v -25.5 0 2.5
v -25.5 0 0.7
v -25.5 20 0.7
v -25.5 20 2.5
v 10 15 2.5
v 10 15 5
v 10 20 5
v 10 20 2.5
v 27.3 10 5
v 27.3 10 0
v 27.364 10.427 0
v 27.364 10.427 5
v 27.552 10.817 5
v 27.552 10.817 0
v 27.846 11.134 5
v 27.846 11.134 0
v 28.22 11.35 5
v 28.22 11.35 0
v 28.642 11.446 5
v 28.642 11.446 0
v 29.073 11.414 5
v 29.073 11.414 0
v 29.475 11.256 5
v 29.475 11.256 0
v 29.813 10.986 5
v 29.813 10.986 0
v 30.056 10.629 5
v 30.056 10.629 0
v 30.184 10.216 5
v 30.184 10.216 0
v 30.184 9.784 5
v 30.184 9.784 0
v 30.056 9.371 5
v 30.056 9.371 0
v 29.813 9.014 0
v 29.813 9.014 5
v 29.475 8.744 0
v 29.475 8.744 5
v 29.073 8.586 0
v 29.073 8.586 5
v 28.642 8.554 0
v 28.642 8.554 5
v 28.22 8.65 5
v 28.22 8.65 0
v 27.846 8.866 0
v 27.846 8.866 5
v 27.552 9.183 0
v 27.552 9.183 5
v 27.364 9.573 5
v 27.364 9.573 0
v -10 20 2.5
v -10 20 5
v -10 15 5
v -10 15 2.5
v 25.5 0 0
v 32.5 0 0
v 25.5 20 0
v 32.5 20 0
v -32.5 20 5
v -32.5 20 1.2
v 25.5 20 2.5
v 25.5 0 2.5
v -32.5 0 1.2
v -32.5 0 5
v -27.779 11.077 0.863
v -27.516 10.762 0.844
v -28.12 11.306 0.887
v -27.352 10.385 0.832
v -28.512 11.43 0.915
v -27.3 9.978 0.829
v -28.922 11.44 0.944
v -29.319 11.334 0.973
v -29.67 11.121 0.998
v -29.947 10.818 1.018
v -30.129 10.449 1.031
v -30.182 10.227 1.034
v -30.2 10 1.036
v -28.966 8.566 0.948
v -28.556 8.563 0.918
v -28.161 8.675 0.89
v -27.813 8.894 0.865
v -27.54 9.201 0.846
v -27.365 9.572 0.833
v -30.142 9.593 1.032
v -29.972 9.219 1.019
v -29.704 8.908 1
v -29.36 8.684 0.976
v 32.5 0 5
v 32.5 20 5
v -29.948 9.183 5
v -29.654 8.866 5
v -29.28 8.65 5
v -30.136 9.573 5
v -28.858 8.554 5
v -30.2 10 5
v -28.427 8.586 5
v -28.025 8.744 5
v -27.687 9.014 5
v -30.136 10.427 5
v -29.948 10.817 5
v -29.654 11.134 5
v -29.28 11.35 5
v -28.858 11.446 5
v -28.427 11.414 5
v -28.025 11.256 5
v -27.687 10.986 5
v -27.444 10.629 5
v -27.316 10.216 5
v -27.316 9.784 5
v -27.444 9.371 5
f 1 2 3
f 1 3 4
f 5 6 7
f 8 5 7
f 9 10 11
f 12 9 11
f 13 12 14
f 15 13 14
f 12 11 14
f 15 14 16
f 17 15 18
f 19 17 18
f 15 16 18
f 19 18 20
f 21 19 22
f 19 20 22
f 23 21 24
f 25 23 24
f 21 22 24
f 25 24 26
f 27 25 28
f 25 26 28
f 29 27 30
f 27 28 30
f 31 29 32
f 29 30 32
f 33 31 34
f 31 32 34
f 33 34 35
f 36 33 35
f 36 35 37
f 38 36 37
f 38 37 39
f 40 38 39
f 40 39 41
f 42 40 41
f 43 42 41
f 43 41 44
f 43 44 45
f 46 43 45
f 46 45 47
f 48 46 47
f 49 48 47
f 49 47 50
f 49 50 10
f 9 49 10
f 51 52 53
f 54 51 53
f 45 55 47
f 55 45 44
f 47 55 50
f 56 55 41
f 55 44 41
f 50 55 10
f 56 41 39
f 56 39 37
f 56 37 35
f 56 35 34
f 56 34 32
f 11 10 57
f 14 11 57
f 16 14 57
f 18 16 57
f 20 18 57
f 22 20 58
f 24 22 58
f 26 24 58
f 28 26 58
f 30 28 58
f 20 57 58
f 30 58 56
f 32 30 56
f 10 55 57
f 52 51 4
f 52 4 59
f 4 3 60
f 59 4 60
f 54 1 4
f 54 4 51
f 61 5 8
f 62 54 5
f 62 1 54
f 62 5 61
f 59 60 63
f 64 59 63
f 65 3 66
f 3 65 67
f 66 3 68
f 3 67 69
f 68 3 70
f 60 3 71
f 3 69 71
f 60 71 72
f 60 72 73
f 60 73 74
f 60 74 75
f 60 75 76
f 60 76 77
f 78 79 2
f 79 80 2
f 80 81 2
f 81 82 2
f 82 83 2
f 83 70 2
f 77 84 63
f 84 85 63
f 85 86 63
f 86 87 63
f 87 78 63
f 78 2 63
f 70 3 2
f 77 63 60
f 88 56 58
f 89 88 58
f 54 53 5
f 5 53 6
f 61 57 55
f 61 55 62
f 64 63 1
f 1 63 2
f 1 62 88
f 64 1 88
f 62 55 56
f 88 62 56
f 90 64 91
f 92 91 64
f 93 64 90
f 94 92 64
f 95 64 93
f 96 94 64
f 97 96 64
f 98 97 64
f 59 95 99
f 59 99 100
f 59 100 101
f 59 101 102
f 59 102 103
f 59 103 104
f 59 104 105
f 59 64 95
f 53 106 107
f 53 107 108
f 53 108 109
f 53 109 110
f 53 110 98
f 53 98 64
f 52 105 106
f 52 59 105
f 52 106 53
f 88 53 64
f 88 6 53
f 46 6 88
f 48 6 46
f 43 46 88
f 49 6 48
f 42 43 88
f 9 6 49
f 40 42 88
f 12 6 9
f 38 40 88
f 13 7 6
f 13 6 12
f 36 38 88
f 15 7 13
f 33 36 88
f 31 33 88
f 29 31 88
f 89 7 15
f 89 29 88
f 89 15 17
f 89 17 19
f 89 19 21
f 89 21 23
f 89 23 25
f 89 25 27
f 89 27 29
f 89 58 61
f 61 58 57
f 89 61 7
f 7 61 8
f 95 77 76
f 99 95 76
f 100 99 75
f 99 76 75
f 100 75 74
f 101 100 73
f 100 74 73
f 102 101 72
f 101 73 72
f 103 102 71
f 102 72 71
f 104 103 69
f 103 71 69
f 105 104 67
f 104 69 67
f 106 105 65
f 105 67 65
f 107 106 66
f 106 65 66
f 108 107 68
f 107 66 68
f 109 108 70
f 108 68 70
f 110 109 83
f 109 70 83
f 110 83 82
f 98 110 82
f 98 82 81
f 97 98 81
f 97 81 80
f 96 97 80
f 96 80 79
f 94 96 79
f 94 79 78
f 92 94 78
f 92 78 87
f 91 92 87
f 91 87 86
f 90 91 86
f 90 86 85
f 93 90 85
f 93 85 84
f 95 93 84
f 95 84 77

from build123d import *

# Parameters (mm, degrees)
BOSS_EXTRUDE1_DEPTH     = 5
CUT_EXTRUDE1_REACH      = 40.487
SKETCH2_W               = 51
SKETCH2_H               = 2.5
M3_5X0_6_TAPPED_HOLE4_D = 2.9
CUT_EXTRUDE2_REACH      = 40.487
CUT_EXTRUDE4_REACH      = 40.487


with BuildPart() as part:
    # Sketch1 → Boss-Extrude1 (new body)
    with BuildSketch(Plane.XY):
        Polygon((0, 0), (32.5, 0), (32.5, 20), (-32.5, 20), (-32.5, 0), align=None)
    extrude(amount=BOSS_EXTRUDE1_DEPTH)

    # Sketch2 → Cut-Extrude1 (cut, up to next)
    with BuildSketch(Plane.XZ, mode=Mode.PRIVATE) as cut_extrude1_sk1:
        with Locations((0, 1.25)):
            Rectangle(SKETCH2_W, SKETCH2_H)
    cut_extrude1_tool1 = extrude(cut_extrude1_sk1.sketch, amount=-CUT_EXTRUDE1_REACH, mode=Mode.PRIVATE) & part.part
    add(cut_extrude1_tool1.solids().sort_by_distance((0, 0, 1.25))[0], mode=Mode.SUBTRACT)

    # M3.5x0.6 Tapped Hole4 (through all)
    with Locations(Plane.XY.offset(5)):
        with Locations((-28.75, 10), (28.75, 10)):
            Hole(M3_5X0_6_TAPPED_HOLE4_D / 2)

    # Sketch12 → Cut-Extrude2 (cut, up to next)
    with BuildSketch(Plane.XY.offset(5), mode=Mode.PRIVATE) as cut_extrude2_sk1:
        Polygon((0, 20), (-10, 20), (-10, 15), (10, 15), (10, 20), align=None)
    cut_extrude2_tool1 = extrude(cut_extrude2_sk1.sketch, amount=-CUT_EXTRUDE2_REACH, mode=Mode.PRIVATE) & part.part
    add(cut_extrude2_tool1.solids().sort_by_distance((0, 17.5, 5))[0], mode=Mode.SUBTRACT)

    # Sketch14 → Cut-Extrude4 (cut, up to next)
    with BuildSketch(Plane.XZ, mode=Mode.PRIVATE) as cut_extrude4_sk1:
        Polygon((-25.5, 0), (-25.5, 0.7), (-32.5, 1.2), (-32.5, 0), align=None)
    cut_extrude4_tool1 = extrude(cut_extrude4_sk1.sketch, amount=-CUT_EXTRUDE4_REACH, mode=Mode.PRIVATE) & part.part
    add(cut_extrude4_tool1.solids().sort_by_distance((-29.307018, 0, 0.485965))[0], mode=Mode.SUBTRACT)


solid = part.part
